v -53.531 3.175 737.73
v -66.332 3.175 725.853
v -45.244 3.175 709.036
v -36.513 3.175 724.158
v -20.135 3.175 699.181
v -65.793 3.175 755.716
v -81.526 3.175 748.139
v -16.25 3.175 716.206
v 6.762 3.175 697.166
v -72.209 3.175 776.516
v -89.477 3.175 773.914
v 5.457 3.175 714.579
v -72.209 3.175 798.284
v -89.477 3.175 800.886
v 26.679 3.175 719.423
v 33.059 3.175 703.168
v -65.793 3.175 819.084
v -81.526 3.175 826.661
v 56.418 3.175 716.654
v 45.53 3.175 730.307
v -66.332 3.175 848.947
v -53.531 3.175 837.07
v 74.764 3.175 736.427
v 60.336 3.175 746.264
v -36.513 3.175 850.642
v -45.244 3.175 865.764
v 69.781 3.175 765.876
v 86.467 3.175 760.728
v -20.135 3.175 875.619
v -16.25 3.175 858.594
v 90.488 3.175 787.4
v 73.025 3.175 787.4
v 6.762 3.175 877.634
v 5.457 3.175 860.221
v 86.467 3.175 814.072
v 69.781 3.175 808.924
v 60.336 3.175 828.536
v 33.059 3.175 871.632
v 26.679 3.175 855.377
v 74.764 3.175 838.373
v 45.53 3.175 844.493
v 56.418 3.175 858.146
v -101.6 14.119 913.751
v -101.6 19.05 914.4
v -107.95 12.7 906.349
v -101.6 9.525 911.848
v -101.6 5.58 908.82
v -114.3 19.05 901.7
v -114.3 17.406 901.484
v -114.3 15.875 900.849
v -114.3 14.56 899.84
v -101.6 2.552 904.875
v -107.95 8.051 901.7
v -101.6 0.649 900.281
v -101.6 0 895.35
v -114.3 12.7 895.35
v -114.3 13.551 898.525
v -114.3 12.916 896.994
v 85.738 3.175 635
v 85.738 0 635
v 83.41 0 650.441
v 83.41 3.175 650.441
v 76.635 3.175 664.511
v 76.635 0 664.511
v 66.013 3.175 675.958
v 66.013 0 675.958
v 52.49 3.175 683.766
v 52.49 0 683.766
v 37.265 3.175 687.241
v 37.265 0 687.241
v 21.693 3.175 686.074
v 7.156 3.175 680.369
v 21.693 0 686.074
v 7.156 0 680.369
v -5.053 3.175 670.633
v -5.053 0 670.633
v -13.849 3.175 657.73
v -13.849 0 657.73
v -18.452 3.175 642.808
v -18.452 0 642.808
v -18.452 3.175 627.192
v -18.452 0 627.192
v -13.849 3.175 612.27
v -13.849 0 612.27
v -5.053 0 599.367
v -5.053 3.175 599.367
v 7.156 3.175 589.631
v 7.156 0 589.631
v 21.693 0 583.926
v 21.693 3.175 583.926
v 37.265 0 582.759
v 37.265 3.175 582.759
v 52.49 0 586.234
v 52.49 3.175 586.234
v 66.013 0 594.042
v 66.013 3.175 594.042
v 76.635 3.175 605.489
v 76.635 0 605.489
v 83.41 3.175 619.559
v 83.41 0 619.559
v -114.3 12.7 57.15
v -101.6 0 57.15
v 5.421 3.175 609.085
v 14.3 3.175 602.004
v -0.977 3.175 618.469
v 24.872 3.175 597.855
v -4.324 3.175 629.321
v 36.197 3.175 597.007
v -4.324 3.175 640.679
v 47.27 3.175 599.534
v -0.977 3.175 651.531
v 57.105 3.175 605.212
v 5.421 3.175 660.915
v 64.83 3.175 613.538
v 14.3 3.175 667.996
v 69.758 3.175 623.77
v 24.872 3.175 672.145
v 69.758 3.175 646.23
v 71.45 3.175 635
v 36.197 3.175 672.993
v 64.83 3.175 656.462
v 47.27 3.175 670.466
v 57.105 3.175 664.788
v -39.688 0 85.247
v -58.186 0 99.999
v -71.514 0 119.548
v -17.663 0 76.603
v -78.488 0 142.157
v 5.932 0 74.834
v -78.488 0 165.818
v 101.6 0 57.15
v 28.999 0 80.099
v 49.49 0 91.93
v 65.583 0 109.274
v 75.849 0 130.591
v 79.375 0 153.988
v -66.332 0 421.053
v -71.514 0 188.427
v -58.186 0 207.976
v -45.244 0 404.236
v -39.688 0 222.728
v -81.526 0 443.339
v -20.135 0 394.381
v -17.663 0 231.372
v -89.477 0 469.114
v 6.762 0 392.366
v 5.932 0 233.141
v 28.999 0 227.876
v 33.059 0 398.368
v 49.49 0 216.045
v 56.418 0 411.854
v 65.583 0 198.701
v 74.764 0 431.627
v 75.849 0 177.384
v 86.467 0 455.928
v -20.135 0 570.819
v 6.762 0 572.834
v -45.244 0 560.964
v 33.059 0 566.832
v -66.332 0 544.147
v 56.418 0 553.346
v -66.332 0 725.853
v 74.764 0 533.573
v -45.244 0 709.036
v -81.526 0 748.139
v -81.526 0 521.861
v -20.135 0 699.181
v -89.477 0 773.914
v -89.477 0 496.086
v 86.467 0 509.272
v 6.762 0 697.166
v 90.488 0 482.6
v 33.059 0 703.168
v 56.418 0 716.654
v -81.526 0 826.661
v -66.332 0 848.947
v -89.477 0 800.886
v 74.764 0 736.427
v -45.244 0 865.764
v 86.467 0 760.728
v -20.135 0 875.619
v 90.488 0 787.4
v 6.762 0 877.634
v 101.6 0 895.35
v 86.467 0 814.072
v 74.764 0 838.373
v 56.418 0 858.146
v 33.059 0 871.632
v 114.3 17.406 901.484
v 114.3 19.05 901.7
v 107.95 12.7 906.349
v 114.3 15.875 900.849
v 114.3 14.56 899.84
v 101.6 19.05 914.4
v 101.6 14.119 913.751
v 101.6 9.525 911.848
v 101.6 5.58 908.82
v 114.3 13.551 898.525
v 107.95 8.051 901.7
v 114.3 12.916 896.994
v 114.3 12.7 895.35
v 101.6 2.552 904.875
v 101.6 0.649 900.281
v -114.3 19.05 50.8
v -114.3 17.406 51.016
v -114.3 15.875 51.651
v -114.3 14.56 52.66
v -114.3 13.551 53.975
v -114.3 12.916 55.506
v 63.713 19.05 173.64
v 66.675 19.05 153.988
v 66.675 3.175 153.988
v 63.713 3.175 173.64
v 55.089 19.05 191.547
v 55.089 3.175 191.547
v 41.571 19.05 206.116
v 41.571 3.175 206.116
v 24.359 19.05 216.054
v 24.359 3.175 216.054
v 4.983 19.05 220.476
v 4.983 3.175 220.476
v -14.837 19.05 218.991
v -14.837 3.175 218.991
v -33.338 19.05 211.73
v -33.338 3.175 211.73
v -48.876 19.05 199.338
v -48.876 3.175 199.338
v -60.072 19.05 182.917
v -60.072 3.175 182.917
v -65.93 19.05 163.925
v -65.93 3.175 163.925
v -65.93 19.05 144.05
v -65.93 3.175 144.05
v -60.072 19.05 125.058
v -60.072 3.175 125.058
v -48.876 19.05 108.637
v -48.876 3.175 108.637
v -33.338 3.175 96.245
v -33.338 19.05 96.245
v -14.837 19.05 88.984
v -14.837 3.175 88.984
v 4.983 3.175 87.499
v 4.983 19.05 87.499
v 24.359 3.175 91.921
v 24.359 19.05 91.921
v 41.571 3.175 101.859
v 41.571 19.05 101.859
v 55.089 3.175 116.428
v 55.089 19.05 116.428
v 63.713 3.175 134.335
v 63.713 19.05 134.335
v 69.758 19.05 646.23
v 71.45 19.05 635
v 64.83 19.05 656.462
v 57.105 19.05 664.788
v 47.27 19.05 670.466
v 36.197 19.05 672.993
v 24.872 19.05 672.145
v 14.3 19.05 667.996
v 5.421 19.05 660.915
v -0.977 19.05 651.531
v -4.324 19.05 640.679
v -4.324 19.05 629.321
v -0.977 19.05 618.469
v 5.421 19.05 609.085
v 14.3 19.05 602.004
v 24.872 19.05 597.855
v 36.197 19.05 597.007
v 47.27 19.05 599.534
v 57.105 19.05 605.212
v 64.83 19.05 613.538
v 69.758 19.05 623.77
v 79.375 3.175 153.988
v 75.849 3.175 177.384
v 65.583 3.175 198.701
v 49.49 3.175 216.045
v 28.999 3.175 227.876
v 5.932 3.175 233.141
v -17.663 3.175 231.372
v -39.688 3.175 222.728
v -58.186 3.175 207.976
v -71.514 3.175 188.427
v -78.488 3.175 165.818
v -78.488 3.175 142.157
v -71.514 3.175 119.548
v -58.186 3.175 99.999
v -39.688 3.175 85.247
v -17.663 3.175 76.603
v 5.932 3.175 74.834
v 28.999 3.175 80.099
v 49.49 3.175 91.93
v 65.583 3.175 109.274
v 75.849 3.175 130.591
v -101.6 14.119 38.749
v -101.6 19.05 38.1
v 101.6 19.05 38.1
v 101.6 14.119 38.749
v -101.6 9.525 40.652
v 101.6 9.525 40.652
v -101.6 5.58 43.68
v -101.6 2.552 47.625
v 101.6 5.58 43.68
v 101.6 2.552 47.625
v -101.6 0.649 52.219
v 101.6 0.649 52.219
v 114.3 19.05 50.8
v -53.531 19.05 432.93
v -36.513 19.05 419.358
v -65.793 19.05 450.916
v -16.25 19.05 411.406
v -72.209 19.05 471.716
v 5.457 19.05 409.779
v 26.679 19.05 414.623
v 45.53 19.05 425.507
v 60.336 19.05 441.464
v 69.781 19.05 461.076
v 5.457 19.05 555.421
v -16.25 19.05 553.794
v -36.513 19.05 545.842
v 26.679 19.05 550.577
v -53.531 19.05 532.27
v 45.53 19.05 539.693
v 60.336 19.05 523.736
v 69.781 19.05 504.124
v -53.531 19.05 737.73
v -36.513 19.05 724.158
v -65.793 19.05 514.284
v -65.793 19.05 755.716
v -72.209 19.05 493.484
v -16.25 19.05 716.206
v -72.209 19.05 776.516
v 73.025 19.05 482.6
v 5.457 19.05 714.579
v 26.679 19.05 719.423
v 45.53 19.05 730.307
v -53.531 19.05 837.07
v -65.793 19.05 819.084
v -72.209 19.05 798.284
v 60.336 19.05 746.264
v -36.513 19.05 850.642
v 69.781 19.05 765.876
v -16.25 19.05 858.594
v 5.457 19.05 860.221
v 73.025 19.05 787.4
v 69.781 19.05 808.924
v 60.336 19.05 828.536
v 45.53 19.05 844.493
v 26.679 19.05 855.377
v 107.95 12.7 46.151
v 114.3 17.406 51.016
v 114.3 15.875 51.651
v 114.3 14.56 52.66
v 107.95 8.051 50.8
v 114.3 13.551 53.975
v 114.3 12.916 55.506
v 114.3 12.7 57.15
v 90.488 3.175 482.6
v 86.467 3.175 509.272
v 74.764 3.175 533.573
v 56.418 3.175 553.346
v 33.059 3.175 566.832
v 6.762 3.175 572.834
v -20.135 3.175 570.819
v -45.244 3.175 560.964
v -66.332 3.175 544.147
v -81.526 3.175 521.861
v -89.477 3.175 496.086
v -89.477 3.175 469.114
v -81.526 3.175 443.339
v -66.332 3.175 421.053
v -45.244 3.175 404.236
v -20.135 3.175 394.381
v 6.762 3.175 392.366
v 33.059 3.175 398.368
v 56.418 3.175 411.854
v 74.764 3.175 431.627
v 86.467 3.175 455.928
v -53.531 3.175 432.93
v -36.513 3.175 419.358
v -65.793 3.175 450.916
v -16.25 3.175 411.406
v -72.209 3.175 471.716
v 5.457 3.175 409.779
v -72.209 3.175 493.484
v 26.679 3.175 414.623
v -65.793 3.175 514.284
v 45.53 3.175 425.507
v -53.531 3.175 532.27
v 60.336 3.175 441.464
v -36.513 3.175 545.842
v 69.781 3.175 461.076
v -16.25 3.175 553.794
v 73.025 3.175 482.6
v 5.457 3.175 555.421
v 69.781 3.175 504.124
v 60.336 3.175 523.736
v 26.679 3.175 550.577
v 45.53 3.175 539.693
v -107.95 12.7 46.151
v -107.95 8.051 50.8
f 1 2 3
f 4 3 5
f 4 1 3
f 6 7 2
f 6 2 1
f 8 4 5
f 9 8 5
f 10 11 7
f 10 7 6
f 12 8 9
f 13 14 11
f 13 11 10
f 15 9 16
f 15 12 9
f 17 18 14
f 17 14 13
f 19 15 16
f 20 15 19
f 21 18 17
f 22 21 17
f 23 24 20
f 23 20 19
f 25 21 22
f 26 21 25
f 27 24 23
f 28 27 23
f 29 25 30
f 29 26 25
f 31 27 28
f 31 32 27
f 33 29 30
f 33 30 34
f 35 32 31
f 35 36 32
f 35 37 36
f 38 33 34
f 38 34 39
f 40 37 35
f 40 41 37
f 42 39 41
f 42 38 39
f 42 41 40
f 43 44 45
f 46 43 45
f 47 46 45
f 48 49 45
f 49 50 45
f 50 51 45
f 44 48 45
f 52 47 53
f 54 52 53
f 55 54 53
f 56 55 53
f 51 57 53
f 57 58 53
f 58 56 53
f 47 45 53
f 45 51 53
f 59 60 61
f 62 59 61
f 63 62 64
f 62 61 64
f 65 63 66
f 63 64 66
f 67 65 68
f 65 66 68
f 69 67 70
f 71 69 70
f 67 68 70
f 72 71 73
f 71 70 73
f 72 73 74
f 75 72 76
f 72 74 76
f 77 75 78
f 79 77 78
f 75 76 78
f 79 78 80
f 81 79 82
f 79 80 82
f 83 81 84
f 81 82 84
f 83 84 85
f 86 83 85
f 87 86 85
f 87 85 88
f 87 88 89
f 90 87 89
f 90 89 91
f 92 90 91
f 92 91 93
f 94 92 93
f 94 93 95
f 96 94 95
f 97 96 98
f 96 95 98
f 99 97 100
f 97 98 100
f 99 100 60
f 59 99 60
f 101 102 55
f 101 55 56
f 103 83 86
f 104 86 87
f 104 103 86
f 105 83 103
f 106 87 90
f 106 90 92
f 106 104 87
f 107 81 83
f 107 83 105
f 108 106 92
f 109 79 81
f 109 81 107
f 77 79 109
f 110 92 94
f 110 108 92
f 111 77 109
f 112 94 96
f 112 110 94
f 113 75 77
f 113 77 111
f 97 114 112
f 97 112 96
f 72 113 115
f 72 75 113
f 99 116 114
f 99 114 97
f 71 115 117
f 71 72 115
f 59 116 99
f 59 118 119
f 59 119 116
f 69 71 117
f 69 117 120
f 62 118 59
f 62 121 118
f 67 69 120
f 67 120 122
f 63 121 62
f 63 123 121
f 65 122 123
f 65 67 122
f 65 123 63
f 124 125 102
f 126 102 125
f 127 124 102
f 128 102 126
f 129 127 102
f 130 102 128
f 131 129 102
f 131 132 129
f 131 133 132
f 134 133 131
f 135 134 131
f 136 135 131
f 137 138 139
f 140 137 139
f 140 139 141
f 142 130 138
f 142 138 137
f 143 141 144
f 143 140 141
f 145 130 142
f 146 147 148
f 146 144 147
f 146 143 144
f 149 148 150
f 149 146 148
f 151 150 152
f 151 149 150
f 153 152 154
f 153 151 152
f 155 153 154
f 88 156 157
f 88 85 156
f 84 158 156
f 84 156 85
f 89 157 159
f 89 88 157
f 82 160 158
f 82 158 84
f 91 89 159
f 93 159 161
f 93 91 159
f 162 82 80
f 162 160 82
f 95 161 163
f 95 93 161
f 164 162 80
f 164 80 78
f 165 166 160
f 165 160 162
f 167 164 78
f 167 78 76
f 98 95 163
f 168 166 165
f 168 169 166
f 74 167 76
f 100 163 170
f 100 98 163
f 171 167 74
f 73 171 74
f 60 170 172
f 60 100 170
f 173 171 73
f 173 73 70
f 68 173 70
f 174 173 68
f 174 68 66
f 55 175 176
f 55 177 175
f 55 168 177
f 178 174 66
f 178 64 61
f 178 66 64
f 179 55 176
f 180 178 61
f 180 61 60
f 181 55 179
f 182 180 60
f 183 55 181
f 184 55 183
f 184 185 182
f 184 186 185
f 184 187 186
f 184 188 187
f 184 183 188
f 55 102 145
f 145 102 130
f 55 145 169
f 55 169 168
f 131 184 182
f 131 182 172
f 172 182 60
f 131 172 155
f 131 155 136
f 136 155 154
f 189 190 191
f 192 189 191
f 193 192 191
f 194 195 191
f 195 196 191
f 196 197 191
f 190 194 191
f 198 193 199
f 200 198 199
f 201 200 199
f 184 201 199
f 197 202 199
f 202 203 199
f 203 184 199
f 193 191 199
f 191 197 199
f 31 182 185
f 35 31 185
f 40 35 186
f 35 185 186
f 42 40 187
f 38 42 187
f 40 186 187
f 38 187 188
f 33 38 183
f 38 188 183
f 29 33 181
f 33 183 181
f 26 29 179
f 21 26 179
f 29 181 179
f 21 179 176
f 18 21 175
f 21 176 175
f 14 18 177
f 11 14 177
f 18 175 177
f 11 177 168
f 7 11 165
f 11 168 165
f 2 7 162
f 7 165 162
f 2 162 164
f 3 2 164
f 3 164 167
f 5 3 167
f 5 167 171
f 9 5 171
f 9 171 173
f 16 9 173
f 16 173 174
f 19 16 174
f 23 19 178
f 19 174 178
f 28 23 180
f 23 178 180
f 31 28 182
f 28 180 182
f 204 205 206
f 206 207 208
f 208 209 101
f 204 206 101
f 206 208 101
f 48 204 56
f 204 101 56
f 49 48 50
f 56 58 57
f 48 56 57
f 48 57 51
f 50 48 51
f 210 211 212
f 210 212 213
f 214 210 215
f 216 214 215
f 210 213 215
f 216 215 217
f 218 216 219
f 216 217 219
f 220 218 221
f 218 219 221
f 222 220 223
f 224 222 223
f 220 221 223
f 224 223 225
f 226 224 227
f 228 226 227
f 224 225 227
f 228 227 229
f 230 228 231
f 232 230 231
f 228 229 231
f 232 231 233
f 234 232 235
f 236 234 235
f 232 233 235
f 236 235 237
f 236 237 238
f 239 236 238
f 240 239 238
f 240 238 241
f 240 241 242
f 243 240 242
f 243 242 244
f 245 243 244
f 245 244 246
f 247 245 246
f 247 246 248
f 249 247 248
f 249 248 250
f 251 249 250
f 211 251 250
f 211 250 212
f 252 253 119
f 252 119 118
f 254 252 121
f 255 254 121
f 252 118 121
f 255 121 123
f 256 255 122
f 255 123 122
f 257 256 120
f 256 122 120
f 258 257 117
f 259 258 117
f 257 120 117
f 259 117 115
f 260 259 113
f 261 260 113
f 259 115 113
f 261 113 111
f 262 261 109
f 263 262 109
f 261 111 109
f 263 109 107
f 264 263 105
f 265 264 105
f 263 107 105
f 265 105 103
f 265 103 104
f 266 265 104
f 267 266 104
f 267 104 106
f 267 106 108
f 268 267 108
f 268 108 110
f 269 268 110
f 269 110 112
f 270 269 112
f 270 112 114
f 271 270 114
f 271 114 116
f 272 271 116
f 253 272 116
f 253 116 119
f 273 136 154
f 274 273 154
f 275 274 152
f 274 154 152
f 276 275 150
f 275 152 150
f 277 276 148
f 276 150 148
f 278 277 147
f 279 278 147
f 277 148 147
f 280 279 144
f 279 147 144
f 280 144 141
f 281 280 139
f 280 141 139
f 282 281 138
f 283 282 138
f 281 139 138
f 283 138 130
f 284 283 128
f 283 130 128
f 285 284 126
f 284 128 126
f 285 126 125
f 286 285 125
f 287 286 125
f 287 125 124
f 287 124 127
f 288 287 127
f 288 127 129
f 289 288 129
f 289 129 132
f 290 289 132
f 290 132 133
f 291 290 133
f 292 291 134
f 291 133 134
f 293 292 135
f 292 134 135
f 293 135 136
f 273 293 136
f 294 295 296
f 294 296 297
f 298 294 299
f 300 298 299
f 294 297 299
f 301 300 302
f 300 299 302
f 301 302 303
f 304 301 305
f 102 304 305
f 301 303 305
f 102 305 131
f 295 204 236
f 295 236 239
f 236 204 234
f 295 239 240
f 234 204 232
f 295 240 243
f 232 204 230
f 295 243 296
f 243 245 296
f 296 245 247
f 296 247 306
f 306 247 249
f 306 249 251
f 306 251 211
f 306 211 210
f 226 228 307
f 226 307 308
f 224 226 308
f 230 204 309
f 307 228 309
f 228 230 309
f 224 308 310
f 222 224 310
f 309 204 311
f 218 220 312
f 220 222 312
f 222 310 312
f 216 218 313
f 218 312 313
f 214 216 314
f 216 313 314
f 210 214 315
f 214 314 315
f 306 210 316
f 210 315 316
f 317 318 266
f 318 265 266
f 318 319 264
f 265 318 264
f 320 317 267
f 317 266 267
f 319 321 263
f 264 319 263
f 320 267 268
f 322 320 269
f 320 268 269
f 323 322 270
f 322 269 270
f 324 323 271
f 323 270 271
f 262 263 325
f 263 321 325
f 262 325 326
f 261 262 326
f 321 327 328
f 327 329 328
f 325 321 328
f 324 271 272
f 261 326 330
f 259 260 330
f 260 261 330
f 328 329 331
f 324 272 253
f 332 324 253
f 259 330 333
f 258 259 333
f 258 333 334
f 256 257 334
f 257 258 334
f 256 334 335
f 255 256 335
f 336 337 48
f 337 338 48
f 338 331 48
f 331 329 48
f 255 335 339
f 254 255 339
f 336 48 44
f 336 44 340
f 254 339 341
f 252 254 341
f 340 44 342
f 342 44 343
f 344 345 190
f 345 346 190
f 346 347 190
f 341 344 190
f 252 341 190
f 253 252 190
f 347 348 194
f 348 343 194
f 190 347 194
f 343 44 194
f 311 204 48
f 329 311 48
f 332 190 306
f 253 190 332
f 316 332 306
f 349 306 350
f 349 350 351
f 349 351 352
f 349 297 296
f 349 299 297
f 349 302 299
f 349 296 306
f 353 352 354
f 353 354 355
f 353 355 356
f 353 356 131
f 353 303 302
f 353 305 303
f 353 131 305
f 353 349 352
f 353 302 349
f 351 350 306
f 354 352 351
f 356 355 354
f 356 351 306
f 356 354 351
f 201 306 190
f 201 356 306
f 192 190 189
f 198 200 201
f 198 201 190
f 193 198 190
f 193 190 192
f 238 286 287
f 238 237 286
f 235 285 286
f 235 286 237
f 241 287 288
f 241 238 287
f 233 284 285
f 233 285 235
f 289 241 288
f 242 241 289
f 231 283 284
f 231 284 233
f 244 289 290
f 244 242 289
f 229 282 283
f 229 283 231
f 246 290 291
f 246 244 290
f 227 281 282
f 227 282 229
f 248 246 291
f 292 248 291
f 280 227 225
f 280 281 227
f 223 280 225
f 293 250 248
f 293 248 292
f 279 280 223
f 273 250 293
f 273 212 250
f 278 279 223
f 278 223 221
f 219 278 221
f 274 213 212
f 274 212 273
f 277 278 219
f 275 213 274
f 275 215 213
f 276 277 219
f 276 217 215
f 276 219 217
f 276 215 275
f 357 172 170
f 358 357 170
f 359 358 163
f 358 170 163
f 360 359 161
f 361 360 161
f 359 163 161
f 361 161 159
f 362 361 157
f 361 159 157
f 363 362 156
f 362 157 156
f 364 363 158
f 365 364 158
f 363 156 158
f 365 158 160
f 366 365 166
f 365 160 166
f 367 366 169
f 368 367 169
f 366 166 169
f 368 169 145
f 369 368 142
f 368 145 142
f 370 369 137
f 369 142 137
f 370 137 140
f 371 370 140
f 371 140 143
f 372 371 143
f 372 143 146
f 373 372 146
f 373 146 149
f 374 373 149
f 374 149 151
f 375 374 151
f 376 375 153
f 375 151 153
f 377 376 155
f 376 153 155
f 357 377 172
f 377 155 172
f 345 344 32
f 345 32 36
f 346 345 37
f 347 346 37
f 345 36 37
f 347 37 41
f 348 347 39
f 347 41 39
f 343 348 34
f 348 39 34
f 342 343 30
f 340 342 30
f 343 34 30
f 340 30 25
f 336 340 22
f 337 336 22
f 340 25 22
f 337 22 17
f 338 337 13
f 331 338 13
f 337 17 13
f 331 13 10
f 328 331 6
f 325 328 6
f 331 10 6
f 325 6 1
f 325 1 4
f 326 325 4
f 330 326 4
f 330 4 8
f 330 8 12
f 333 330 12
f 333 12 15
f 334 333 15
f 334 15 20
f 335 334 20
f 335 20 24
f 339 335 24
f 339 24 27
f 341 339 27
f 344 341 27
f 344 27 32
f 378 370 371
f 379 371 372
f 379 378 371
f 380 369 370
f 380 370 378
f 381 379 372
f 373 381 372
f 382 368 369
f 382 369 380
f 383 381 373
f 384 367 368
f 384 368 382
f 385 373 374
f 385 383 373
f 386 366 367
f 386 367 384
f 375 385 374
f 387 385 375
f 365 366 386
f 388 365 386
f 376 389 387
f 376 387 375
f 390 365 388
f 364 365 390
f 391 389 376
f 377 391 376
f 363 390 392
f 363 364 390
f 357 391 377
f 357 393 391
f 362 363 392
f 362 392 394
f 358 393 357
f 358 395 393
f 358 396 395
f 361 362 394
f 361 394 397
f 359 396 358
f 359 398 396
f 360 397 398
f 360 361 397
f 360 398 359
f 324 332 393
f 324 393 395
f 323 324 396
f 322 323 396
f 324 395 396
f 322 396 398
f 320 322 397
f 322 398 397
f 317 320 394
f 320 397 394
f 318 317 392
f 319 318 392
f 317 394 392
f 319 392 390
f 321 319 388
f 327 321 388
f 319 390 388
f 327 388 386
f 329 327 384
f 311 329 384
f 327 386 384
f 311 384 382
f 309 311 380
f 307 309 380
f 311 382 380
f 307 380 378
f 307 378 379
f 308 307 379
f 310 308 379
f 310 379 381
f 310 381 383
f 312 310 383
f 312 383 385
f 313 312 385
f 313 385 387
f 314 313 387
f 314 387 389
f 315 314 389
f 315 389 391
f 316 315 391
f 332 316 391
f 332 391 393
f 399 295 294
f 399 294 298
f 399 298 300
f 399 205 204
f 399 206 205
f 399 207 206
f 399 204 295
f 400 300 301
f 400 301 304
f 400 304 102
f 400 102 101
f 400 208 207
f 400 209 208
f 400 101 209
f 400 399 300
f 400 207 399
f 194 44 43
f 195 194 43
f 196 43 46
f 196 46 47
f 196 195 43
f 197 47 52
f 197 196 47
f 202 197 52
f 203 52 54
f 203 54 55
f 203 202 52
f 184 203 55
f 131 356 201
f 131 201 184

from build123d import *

# Parameters (mm, degrees)
F0_W         = 228.6
F0_H         = 876.3
F0_R         = 79.375
F0_R_2       = 90.4875
F0_R_3       = 52.3875
F0_R_4       = 73.025
F0_R_5       = 38.1
F0_R_6       = 66.675
F1_DEPTH     = 19.05
F2_DEPTH     = 3.175
F4_R         = 19.04999
F5_T1_DEPTH  = 838.20002
F5_T3_DEPTH  = 32.6603839472
F5_T6_ANGLE  = 90
F5_T8_ANGLE  = 90
F5_T10_ANGLE = 90
F5_T12_ANGLE = 90


# Not quite as in the source:
# - a fillet or chamfer that OpenCascade refuses, or shapes differently, is made with other operations: its cross-section is extruded or revolved along the edge and cut away or added
# - a fillet or chamfer is up to 0.001 mm smaller than in the source, because OpenCascade refuses the exact size


with BuildPart() as f1:
    # F0 (on Front) → F1 (new body)
    with BuildSketch(Plane.XZ):
        with Locations((0, 476.25)):
            Rectangle(F0_W, F0_H)
        with Locations((0, 153.9875)):
            Circle(F0_R, mode=Mode.SUBTRACT)
        with Locations((0, 482.6)):
            Circle(F0_R_2, mode=Mode.SUBTRACT)
        with Locations((33.3502, 635)):
            Circle(F0_R_3, mode=Mode.SUBTRACT)
        with Locations((0, 787.4)):
            Circle(F0_R_2, mode=Mode.SUBTRACT)
        with Locations((0, 787.4)):
            Circle(F0_R_2)
        with Locations((0, 787.4)):
            Circle(F0_R_4, mode=Mode.SUBTRACT)
        with Locations((33.3502, 635)):
            Circle(F0_R_3)
        with Locations((33.3502, 635)):
            Circle(F0_R_5, mode=Mode.SUBTRACT)
        with Locations((0, 482.6)):
            Circle(F0_R_2)
        with Locations((0, 482.6)):
            Circle(F0_R_4, mode=Mode.SUBTRACT)
        with Locations((0, 153.9875)):
            Circle(F0_R)
        with Locations((0, 153.9875)):
            Circle(F0_R_6, mode=Mode.SUBTRACT)
    extrude(amount=-F1_DEPTH)

    # F0 (on Front) → F2 (cut)
    with BuildSketch(Plane.XZ):
        with Locations((0, 787.4)):
            Circle(F0_R_2)
        with Locations((0, 787.4)):
            Circle(F0_R_4, mode=Mode.SUBTRACT)
        with Locations((33.3502, 635)):
            Circle(F0_R_3)
        with Locations((33.3502, 635)):
            Circle(F0_R_5, mode=Mode.SUBTRACT)
        with Locations((0, 482.6)):
            Circle(F0_R_2)
        with Locations((0, 482.6)):
            Circle(F0_R_4, mode=Mode.SUBTRACT)
        with Locations((0, 153.9875)):
            Circle(F0_R)
        with Locations((0, 153.9875)):
            Circle(F0_R_6, mode=Mode.SUBTRACT)
    extrude(amount=-F2_DEPTH, mode=Mode.SUBTRACT)

    # F4 (radius 19.05 in the source; OpenCascade refuses exactly that, so slightly less here)
    f4_edges = [f1.edges().sort_by_distance(p)[0] for p in [
        (0, 0, 914.4),
        (0, 0, 38.1),
    ]]
    fillet(f4_edges, radius=F4_R)

    # F5: chamfer of 12.7 on 2 edges, made by hand

    # F5_s2 → F5_t1 (cut)
    with BuildSketch(Plane.XY.offset(57.14999)):
        Polygon((-101.6, 0), (-114.3, 12.7), (-114.3, 0), align=None)
        Polygon((114.3, 12.7), (101.6, 0), (114.3, 0), align=None)
    extrude(amount=F5_T1_DEPTH, mode=Mode.SUBTRACT)

    # F5_s4 → F5_t3 (cut)
    with BuildSketch(Plane.XZ.offset(-51.7103739472)):
        Polygon((114.3, 901.7), (101.6, 914.4), (114.3, 914.4), align=None)
        Polygon((114.3, 50.8), (101.6, 38.1), (114.3, 38.1), align=None)
        Polygon((-101.6, 38.1), (-114.3, 50.8), (-114.3, 38.1), align=None)
        Polygon((-101.6, 914.4), (-114.3, 901.7), (-114.3, 914.4), align=None)
    extrude(amount=F5_T3_DEPTH, mode=Mode.SUBTRACT)

    # F5_s5 → F5_t6 (revolve, cut)
    with BuildSketch(Plane.XZ.offset(-19.04999)):
        Polygon((114.3, 50.8), (101.6, 38.1), (114.3, 38.1), align=None)
    revolve(axis=Axis((114.3, 19.04999, 57.14999), (-1, 0, 0)), revolution_arc=F5_T6_ANGLE, mode=Mode.SUBTRACT)

    # F5_s7 → F5_t8 (revolve, cut)
    with BuildSketch(Plane.XZ.offset(-19.04999)):
        Polygon((114.3, 901.7), (101.6, 914.4), (114.3, 914.4), align=None)
    revolve(axis=Axis((114.3, 19.04999, 895.35001), (1, 0, 0)), revolution_arc=F5_T8_ANGLE, mode=Mode.SUBTRACT)

    # F5_s9 → F5_t10 (revolve, cut)
    with BuildSketch(Plane.XZ.offset(-19.04999)):
        Polygon((-101.6, 914.4), (-114.3, 901.7), (-114.3, 914.4), align=None)
    revolve(axis=Axis((-114.3, 19.04999, 895.35001), (1, 0, 0)), revolution_arc=F5_T10_ANGLE, mode=Mode.SUBTRACT)

    # F5_s11 → F5_t12 (revolve, cut)
    with BuildSketch(Plane.XZ.offset(-19.04999)):
        Polygon((-101.6, 38.1), (-114.3, 50.8), (-114.3, 38.1), align=None)
    revolve(axis=Axis((-114.3, 19.04999, 57.14999), (-1, 0, 0)), revolution_arc=F5_T12_ANGLE, mode=Mode.SUBTRACT)


solid = f1.part
